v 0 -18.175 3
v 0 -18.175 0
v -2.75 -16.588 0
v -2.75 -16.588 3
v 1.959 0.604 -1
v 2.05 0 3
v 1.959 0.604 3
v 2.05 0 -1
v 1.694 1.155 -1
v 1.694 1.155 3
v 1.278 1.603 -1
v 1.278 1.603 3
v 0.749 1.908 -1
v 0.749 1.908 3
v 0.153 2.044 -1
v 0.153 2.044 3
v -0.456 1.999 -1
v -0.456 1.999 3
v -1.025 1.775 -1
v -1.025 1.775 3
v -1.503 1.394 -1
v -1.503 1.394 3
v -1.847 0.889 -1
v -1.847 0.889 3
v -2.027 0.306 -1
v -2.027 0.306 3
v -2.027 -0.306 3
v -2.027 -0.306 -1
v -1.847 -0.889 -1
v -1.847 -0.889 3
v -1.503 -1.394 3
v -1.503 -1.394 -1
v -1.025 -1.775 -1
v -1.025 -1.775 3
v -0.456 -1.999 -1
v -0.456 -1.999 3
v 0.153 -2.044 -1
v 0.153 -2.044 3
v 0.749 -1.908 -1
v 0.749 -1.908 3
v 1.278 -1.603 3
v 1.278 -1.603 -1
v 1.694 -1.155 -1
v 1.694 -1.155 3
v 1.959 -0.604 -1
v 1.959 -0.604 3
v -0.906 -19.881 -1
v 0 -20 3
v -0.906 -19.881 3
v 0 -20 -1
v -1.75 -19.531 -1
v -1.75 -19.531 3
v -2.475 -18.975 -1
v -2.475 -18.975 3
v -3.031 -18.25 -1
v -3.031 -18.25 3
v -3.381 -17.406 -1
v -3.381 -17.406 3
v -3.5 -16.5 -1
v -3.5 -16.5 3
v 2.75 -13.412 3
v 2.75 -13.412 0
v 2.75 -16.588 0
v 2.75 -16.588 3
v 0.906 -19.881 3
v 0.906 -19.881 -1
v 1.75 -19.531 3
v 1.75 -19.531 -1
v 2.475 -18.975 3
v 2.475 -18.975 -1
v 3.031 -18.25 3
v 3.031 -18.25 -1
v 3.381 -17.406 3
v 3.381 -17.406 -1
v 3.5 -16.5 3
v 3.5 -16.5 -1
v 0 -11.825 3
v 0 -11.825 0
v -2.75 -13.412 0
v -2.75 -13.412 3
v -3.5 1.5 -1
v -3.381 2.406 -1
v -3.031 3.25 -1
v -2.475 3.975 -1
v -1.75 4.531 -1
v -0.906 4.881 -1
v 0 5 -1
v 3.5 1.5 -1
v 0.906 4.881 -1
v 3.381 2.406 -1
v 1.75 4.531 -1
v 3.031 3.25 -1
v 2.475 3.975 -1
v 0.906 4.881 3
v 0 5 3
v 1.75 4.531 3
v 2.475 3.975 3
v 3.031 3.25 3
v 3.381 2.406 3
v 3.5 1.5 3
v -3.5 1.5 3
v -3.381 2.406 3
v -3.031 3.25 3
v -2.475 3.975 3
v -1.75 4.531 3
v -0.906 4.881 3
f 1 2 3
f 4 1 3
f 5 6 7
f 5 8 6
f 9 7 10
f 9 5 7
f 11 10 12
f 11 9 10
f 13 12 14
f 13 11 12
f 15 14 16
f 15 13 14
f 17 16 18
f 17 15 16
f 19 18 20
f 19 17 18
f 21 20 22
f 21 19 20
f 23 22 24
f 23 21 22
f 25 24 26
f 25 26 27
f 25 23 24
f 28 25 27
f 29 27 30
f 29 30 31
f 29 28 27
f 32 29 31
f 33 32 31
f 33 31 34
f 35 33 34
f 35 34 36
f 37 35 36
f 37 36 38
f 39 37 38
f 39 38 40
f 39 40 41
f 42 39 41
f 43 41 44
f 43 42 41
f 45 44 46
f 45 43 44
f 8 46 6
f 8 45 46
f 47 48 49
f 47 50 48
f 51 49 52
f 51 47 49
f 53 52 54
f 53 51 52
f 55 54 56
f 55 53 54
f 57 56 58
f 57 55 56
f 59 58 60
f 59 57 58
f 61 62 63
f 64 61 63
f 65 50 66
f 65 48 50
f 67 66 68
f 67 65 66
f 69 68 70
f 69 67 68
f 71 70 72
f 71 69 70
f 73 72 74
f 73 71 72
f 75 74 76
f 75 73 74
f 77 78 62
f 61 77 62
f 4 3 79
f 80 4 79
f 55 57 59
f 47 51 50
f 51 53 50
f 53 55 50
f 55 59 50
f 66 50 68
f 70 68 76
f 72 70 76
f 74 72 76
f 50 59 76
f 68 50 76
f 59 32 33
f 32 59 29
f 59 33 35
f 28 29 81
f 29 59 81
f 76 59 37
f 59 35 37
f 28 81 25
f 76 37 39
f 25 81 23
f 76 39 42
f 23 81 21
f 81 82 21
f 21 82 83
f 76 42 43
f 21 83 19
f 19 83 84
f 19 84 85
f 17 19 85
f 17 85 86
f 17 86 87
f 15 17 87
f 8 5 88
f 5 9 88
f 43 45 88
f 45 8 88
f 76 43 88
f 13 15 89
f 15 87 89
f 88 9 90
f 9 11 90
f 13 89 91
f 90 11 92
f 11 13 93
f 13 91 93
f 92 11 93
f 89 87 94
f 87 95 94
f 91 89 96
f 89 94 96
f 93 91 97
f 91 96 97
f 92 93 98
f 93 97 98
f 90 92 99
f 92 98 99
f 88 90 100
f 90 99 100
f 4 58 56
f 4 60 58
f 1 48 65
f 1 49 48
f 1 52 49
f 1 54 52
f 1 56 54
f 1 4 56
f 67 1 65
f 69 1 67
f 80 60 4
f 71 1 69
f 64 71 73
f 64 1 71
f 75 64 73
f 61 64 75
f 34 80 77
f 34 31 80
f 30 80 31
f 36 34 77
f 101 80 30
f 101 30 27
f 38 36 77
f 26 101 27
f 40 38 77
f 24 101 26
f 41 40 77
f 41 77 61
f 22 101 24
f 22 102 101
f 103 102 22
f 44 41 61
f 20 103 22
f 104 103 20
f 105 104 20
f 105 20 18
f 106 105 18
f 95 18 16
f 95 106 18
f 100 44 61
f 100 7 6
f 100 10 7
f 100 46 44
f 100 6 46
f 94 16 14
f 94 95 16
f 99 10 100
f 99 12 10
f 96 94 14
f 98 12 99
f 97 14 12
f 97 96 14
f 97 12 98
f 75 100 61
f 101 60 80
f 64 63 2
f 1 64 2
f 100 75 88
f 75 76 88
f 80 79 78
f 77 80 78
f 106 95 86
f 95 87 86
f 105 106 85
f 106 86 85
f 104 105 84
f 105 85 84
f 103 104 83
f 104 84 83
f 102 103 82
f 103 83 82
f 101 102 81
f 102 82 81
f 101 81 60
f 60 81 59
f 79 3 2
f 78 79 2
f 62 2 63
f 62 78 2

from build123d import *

# Parameters (mm, degrees)
F0_R     = 2.05
F1_DEPTH = 1
F2_DEPTH = 3
F3_R     = 3.49999


# Not quite as in the source:
# - a fillet or chamfer is up to 0.001 mm smaller than in the source, because OpenCascade refuses the exact size


with BuildPart() as f1:
    # F0 (on Top) → F1 (new body)
    with BuildSketch(Plane.XY):
        Polygon((-3.5, -20), (3.5, -20), (3.5, 5), (0, 5), (-3.5, 5), align=None)
        Polygon((0, -18.1754264805), (-2.75, -16.5877132403), (-2.75, -13.4122867597), (0, -11.8245735195), (2.75, -13.4122867597), (2.75, -16.5877132403), align=None, mode=Mode.SUBTRACT)
        Circle(F0_R, mode=Mode.SUBTRACT)
        Polygon((-2.75, -13.4122867597), (-2.75, -16.5877132403), (0, -18.1754264805), (2.75, -16.5877132403), (2.75, -13.4122867597), (0, -11.8245735195), align=None)
    extrude(amount=-F1_DEPTH)

    # F0 (on Top) → F2 (join)
    with BuildSketch(Plane.XY):
        Polygon((-3.5, -20), (3.5, -20), (3.5, 5), (0, 5), (-3.5, 5), align=None)
        Polygon((0, -18.1754264805), (-2.75, -16.5877132403), (-2.75, -13.4122867597), (0, -11.8245735195), (2.75, -13.4122867597), (2.75, -16.5877132403), align=None, mode=Mode.SUBTRACT)
        Circle(F0_R, mode=Mode.SUBTRACT)
    extrude(amount=F2_DEPTH)

    # F3 (radius 3.5 in the source; OpenCascade refuses exactly that, so slightly less here)
    f3_edges = [f1.edges().sort_by_distance(p)[0] for p in [
        (3.5, -20, 1),
        (-3.5, -20, 1),
        (3.5, 5, 1),
        (-3.5, 5, 1),
    ]]
    fillet(f3_edges, radius=F3_R)


solid = f1.part
